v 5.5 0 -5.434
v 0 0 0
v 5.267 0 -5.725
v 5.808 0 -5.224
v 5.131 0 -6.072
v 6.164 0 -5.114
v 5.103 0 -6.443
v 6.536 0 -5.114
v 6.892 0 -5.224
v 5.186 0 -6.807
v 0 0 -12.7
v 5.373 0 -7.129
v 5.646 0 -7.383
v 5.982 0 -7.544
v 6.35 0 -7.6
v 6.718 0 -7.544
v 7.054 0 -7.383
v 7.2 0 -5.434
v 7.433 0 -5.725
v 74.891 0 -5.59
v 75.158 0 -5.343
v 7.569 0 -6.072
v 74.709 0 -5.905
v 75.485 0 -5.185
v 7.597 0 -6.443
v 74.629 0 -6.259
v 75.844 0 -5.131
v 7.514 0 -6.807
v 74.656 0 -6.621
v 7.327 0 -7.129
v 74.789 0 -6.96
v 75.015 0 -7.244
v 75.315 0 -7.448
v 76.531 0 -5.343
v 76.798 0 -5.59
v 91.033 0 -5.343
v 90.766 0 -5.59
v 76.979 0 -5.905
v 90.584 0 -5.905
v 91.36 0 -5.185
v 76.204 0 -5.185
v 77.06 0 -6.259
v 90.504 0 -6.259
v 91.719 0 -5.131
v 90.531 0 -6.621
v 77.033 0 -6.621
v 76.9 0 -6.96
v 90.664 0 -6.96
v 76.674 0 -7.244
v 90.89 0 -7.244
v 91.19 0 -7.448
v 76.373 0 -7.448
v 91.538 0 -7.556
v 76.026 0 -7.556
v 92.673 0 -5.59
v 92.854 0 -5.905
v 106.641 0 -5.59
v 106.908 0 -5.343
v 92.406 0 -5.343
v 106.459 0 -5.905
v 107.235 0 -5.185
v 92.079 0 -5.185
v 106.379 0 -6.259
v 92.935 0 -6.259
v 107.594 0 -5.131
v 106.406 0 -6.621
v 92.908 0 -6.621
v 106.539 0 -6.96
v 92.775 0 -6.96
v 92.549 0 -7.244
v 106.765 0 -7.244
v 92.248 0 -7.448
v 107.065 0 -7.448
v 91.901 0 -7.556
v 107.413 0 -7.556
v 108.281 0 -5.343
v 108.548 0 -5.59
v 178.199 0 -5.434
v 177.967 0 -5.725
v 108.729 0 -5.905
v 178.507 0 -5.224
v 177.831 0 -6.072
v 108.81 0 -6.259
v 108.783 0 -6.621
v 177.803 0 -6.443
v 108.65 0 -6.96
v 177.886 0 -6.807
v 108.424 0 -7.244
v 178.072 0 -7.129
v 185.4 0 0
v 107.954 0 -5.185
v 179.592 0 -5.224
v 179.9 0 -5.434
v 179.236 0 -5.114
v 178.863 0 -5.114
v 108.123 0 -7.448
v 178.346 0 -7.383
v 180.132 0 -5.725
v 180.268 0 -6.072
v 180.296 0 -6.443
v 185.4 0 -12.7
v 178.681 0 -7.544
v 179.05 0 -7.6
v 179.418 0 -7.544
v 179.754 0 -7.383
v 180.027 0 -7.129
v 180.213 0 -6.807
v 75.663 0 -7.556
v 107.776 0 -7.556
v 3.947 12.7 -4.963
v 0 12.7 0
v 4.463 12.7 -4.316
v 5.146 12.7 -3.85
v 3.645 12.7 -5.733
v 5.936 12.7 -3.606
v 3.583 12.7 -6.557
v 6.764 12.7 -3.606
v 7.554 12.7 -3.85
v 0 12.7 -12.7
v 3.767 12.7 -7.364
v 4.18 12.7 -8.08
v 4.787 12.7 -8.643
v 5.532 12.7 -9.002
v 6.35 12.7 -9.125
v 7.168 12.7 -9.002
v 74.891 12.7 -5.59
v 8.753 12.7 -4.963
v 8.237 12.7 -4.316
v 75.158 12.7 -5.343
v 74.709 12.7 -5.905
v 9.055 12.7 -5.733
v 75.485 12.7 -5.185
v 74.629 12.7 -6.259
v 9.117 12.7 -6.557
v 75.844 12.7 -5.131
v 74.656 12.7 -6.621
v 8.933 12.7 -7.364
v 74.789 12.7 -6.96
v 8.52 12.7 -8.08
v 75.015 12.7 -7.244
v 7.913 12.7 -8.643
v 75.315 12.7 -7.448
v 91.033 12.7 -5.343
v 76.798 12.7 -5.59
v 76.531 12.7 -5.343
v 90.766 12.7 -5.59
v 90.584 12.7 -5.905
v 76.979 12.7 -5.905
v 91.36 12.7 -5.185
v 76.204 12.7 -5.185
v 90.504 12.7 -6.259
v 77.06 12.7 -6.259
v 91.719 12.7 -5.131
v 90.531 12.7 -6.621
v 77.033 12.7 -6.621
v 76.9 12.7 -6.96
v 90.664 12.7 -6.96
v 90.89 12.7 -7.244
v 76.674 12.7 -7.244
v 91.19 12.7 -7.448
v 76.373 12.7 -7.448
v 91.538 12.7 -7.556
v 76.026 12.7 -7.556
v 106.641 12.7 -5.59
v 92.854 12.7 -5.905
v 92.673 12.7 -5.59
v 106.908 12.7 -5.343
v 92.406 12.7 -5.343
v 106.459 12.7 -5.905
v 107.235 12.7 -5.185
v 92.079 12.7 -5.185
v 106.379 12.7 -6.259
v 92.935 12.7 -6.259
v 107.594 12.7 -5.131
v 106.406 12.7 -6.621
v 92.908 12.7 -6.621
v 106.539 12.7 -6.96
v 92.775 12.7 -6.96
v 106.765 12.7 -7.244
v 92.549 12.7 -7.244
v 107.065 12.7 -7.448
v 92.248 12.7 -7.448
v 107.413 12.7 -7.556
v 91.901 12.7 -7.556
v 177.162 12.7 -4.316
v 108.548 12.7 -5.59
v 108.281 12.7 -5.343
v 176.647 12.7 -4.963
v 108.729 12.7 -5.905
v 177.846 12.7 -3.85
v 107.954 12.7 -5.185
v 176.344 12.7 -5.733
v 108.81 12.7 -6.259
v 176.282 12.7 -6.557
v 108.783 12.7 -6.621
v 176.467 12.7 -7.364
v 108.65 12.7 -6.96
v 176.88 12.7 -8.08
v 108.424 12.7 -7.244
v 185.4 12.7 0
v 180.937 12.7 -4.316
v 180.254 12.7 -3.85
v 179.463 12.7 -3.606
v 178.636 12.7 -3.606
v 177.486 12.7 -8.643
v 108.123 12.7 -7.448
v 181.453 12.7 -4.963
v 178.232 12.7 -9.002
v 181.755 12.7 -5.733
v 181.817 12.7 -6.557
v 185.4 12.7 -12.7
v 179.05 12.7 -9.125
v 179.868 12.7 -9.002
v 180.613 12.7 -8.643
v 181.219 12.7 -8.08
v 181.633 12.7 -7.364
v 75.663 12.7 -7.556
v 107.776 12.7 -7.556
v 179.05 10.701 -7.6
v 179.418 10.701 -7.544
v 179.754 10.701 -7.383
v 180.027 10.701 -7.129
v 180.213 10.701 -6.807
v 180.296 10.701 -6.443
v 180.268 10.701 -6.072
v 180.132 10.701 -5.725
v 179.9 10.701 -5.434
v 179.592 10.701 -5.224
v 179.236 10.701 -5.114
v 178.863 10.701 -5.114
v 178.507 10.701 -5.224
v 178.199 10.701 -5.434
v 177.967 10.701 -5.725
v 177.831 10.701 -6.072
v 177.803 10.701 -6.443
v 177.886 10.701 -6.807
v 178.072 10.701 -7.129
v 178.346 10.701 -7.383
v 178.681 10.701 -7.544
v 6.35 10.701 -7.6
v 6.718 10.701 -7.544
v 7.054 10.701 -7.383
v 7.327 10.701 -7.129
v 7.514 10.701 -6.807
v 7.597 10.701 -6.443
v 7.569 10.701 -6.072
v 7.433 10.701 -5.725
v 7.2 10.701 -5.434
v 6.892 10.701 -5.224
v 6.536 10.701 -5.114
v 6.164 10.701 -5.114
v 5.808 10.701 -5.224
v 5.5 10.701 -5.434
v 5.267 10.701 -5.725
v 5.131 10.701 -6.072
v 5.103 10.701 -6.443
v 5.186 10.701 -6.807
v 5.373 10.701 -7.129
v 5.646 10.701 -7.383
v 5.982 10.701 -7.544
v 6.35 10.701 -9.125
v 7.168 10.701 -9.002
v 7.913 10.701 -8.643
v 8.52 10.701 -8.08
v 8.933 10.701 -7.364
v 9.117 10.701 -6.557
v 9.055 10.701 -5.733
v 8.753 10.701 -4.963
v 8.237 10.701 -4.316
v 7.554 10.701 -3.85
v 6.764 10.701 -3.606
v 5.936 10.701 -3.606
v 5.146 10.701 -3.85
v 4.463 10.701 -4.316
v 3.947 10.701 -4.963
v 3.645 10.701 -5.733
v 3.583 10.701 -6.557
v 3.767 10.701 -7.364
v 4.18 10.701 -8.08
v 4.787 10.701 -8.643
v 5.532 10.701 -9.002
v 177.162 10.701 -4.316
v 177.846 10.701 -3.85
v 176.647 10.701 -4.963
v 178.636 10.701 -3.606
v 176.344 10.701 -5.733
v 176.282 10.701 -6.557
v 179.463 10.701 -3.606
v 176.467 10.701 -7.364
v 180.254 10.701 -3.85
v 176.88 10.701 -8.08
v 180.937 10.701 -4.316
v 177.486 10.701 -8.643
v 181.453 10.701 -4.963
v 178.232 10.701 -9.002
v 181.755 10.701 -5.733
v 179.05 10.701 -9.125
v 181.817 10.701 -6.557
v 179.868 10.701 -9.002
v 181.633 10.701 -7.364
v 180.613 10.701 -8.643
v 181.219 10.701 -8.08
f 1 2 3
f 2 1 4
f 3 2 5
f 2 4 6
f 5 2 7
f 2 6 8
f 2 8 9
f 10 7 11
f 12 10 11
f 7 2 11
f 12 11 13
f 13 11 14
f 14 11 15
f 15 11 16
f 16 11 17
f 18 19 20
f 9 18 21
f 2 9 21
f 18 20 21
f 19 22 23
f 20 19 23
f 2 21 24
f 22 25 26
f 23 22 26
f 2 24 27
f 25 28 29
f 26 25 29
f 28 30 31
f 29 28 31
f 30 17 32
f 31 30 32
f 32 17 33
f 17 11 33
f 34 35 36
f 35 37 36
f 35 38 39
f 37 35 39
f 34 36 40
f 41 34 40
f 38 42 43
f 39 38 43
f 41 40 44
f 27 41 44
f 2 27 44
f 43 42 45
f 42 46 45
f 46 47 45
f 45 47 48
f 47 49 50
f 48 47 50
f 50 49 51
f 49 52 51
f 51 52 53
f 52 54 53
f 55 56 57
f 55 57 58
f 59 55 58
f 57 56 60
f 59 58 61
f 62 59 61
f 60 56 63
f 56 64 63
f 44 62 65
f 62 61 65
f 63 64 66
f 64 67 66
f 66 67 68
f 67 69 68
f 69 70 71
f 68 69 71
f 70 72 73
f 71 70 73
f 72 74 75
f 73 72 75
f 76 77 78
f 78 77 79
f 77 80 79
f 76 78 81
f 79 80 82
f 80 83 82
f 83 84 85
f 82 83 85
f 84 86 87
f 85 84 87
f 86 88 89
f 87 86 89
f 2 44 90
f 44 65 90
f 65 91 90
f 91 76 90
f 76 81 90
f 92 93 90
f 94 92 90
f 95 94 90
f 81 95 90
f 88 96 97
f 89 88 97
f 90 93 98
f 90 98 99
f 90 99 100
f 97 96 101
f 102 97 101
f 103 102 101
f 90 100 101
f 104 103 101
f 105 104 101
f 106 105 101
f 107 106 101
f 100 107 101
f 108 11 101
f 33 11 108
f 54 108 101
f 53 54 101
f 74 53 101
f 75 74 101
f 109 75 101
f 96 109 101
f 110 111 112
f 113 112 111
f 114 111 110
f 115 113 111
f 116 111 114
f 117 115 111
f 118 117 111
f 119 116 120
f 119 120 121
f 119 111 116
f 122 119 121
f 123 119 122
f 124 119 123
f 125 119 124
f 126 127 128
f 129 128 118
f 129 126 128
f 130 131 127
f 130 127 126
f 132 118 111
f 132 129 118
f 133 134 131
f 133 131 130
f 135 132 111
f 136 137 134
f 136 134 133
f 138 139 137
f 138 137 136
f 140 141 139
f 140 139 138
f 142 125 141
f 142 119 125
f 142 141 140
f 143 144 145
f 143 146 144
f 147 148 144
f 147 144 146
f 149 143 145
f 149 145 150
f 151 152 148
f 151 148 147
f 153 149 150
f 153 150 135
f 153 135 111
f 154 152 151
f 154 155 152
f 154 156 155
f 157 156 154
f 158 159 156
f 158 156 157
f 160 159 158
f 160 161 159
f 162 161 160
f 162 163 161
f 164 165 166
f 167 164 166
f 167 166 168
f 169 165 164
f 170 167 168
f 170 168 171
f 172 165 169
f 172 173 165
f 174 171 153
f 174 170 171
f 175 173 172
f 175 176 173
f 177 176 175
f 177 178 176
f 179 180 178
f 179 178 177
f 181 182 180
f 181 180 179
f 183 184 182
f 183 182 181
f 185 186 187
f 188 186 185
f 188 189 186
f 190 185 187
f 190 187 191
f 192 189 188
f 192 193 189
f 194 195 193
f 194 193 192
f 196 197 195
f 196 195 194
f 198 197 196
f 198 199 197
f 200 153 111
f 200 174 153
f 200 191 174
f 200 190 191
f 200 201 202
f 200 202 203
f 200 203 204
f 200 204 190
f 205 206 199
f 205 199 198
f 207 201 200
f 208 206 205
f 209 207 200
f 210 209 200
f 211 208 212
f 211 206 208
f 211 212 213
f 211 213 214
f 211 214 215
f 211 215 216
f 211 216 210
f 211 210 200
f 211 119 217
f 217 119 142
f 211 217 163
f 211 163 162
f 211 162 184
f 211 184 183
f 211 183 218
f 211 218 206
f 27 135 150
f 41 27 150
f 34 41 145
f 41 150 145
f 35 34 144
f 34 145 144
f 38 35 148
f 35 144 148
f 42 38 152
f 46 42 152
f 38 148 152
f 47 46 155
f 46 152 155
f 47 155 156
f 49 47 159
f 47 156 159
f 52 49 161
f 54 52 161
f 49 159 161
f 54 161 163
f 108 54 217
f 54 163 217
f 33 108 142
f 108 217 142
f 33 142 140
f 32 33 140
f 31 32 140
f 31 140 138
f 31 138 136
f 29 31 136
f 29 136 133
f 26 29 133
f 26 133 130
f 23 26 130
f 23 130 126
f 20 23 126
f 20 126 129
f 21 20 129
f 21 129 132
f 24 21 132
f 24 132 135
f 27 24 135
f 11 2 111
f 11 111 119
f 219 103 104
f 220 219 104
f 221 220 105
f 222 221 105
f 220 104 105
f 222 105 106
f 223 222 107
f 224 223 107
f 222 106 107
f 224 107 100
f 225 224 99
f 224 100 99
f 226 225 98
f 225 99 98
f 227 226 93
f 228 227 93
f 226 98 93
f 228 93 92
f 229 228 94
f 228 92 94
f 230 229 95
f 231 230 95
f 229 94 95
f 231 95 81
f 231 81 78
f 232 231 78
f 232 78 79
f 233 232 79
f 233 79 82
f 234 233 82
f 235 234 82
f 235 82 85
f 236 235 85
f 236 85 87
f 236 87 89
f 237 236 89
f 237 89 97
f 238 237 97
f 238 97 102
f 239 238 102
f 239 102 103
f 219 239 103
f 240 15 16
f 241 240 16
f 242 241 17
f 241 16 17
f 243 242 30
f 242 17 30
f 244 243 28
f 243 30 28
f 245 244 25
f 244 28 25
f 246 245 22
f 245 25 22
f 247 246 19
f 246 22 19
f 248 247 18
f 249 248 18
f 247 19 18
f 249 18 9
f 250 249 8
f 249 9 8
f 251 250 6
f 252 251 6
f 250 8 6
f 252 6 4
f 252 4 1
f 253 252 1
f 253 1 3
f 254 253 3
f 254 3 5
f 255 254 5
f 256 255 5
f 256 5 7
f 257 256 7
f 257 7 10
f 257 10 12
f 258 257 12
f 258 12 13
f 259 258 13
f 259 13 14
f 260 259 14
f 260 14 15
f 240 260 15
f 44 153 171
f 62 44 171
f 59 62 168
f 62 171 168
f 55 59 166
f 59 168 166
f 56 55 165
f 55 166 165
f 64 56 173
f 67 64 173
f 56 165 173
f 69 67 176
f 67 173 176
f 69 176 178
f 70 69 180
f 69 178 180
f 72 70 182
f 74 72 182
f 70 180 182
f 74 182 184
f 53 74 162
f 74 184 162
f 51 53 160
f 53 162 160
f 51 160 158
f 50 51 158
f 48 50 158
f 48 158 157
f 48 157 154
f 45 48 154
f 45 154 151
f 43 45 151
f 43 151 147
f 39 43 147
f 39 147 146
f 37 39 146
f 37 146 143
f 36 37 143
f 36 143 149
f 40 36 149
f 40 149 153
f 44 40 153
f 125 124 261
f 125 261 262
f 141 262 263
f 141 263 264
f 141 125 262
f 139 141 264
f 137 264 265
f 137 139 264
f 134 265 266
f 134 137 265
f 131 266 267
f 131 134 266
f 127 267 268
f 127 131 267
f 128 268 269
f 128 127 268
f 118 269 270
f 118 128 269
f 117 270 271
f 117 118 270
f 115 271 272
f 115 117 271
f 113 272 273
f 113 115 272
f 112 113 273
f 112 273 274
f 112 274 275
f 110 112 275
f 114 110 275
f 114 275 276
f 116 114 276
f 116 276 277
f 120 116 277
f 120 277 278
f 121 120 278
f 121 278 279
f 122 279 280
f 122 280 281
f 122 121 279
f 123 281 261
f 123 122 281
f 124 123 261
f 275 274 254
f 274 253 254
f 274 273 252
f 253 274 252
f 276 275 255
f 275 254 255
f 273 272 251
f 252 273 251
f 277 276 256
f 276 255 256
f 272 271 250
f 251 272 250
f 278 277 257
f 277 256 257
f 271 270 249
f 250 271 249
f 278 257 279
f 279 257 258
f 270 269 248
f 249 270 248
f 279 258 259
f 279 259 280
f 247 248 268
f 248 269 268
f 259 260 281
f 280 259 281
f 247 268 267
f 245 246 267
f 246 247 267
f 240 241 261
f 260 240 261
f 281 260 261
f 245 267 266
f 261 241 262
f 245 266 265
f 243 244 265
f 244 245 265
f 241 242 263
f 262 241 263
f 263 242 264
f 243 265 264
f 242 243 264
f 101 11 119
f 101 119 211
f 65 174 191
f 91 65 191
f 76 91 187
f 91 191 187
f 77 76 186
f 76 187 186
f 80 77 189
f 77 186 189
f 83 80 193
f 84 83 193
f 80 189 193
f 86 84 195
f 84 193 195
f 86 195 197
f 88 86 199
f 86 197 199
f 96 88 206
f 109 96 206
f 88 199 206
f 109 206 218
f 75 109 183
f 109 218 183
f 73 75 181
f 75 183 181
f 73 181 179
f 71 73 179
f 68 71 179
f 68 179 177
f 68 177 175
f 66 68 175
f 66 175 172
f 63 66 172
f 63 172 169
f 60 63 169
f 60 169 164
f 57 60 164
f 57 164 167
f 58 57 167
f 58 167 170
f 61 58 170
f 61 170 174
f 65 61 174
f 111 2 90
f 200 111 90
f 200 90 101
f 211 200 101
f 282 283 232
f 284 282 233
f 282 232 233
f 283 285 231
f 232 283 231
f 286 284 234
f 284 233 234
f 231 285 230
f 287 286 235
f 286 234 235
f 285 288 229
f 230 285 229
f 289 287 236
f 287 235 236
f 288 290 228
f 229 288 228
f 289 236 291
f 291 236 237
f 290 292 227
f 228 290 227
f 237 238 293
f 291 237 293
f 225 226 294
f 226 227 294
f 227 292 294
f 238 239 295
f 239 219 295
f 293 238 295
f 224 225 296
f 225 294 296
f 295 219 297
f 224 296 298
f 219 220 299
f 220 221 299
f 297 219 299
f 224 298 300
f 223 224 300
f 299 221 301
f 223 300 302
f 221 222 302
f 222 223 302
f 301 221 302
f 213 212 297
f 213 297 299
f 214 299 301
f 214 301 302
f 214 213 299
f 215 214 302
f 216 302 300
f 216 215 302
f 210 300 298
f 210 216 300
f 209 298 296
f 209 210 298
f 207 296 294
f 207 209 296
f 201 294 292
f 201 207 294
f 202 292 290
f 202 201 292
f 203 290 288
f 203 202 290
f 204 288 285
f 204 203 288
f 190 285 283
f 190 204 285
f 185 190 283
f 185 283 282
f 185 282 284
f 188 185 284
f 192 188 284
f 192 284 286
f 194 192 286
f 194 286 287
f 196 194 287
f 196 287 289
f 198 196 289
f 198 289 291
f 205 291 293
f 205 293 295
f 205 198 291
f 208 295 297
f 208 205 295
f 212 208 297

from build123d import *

# Parameters (mm, degrees)
SKETCH1_W           = 185.39968
SKETCH1_H           = 12.7
BOSS_EXTRUDE1_DEPTH = 12.7
SKETCH4_R           = 1.25
CUT_EXTRUDE3_DEPTH  = 187.267606803
SKETCH5_R           = 2.77495
CUT_EXTRUDE4_DEPTH  = 1.99898
SKETCH6_R           = 1.2192
CUT_EXTRUDE5_DEPTH  = 187.267606803


with BuildPart() as part:
    # Sketch1 → Boss-Extrude1 (new body)
    with BuildSketch(Plane(origin=(0, 0, 0), x_dir=(1, 0, 0), z_dir=(0, 1, 0))):
        with Locations((92.69984, 6.35)):
            Rectangle(SKETCH1_W, SKETCH1_H)
    extrude(amount=BOSS_EXTRUDE1_DEPTH)

    # Sketch4 → Cut-Extrude3 (cut, through all)
    with BuildSketch(Plane.XZ):
        with Locations(Location((179.04968, -6.35, 0), (0, 0, 270))):
            Circle(SKETCH4_R)
        with Locations(Location((6.35, -6.35, 0), (0, 0, 270))):
            Circle(SKETCH4_R)
    extrude(amount=-CUT_EXTRUDE3_DEPTH, mode=Mode.SUBTRACT)

    # Sketch5 → Cut-Extrude4 (cut)
    with BuildSketch(Plane.XZ.offset(-12.7)):
        with Locations(Location((179.04968, -6.35, 0), (0, 0, 270))):
            Circle(SKETCH5_R)
        with Locations(Location((6.35, -6.35, 0), (0, 0, 270))):
            Circle(SKETCH5_R)
    extrude(amount=CUT_EXTRUDE4_DEPTH, mode=Mode.SUBTRACT)

    # Sketch6 → Cut-Extrude5 (cut, through all)
    with BuildSketch(Plane(origin=(0, 12.7, 0), x_dir=(1, 0, 0), z_dir=(0, 1, 0))):
        with Locations(Location((91.7194, 6.35, 0), (0, 0, 270))):
            Circle(SKETCH6_R)
        with Locations(Location((107.5944, 6.35, 0), (0, 0, 270))):
            Circle(SKETCH6_R)
        with Locations(Location((75.8444, 6.35, 0), (0, 0, 270))):
            Circle(SKETCH6_R)
    extrude(amount=-CUT_EXTRUDE5_DEPTH, mode=Mode.SUBTRACT)


solid = part.part
